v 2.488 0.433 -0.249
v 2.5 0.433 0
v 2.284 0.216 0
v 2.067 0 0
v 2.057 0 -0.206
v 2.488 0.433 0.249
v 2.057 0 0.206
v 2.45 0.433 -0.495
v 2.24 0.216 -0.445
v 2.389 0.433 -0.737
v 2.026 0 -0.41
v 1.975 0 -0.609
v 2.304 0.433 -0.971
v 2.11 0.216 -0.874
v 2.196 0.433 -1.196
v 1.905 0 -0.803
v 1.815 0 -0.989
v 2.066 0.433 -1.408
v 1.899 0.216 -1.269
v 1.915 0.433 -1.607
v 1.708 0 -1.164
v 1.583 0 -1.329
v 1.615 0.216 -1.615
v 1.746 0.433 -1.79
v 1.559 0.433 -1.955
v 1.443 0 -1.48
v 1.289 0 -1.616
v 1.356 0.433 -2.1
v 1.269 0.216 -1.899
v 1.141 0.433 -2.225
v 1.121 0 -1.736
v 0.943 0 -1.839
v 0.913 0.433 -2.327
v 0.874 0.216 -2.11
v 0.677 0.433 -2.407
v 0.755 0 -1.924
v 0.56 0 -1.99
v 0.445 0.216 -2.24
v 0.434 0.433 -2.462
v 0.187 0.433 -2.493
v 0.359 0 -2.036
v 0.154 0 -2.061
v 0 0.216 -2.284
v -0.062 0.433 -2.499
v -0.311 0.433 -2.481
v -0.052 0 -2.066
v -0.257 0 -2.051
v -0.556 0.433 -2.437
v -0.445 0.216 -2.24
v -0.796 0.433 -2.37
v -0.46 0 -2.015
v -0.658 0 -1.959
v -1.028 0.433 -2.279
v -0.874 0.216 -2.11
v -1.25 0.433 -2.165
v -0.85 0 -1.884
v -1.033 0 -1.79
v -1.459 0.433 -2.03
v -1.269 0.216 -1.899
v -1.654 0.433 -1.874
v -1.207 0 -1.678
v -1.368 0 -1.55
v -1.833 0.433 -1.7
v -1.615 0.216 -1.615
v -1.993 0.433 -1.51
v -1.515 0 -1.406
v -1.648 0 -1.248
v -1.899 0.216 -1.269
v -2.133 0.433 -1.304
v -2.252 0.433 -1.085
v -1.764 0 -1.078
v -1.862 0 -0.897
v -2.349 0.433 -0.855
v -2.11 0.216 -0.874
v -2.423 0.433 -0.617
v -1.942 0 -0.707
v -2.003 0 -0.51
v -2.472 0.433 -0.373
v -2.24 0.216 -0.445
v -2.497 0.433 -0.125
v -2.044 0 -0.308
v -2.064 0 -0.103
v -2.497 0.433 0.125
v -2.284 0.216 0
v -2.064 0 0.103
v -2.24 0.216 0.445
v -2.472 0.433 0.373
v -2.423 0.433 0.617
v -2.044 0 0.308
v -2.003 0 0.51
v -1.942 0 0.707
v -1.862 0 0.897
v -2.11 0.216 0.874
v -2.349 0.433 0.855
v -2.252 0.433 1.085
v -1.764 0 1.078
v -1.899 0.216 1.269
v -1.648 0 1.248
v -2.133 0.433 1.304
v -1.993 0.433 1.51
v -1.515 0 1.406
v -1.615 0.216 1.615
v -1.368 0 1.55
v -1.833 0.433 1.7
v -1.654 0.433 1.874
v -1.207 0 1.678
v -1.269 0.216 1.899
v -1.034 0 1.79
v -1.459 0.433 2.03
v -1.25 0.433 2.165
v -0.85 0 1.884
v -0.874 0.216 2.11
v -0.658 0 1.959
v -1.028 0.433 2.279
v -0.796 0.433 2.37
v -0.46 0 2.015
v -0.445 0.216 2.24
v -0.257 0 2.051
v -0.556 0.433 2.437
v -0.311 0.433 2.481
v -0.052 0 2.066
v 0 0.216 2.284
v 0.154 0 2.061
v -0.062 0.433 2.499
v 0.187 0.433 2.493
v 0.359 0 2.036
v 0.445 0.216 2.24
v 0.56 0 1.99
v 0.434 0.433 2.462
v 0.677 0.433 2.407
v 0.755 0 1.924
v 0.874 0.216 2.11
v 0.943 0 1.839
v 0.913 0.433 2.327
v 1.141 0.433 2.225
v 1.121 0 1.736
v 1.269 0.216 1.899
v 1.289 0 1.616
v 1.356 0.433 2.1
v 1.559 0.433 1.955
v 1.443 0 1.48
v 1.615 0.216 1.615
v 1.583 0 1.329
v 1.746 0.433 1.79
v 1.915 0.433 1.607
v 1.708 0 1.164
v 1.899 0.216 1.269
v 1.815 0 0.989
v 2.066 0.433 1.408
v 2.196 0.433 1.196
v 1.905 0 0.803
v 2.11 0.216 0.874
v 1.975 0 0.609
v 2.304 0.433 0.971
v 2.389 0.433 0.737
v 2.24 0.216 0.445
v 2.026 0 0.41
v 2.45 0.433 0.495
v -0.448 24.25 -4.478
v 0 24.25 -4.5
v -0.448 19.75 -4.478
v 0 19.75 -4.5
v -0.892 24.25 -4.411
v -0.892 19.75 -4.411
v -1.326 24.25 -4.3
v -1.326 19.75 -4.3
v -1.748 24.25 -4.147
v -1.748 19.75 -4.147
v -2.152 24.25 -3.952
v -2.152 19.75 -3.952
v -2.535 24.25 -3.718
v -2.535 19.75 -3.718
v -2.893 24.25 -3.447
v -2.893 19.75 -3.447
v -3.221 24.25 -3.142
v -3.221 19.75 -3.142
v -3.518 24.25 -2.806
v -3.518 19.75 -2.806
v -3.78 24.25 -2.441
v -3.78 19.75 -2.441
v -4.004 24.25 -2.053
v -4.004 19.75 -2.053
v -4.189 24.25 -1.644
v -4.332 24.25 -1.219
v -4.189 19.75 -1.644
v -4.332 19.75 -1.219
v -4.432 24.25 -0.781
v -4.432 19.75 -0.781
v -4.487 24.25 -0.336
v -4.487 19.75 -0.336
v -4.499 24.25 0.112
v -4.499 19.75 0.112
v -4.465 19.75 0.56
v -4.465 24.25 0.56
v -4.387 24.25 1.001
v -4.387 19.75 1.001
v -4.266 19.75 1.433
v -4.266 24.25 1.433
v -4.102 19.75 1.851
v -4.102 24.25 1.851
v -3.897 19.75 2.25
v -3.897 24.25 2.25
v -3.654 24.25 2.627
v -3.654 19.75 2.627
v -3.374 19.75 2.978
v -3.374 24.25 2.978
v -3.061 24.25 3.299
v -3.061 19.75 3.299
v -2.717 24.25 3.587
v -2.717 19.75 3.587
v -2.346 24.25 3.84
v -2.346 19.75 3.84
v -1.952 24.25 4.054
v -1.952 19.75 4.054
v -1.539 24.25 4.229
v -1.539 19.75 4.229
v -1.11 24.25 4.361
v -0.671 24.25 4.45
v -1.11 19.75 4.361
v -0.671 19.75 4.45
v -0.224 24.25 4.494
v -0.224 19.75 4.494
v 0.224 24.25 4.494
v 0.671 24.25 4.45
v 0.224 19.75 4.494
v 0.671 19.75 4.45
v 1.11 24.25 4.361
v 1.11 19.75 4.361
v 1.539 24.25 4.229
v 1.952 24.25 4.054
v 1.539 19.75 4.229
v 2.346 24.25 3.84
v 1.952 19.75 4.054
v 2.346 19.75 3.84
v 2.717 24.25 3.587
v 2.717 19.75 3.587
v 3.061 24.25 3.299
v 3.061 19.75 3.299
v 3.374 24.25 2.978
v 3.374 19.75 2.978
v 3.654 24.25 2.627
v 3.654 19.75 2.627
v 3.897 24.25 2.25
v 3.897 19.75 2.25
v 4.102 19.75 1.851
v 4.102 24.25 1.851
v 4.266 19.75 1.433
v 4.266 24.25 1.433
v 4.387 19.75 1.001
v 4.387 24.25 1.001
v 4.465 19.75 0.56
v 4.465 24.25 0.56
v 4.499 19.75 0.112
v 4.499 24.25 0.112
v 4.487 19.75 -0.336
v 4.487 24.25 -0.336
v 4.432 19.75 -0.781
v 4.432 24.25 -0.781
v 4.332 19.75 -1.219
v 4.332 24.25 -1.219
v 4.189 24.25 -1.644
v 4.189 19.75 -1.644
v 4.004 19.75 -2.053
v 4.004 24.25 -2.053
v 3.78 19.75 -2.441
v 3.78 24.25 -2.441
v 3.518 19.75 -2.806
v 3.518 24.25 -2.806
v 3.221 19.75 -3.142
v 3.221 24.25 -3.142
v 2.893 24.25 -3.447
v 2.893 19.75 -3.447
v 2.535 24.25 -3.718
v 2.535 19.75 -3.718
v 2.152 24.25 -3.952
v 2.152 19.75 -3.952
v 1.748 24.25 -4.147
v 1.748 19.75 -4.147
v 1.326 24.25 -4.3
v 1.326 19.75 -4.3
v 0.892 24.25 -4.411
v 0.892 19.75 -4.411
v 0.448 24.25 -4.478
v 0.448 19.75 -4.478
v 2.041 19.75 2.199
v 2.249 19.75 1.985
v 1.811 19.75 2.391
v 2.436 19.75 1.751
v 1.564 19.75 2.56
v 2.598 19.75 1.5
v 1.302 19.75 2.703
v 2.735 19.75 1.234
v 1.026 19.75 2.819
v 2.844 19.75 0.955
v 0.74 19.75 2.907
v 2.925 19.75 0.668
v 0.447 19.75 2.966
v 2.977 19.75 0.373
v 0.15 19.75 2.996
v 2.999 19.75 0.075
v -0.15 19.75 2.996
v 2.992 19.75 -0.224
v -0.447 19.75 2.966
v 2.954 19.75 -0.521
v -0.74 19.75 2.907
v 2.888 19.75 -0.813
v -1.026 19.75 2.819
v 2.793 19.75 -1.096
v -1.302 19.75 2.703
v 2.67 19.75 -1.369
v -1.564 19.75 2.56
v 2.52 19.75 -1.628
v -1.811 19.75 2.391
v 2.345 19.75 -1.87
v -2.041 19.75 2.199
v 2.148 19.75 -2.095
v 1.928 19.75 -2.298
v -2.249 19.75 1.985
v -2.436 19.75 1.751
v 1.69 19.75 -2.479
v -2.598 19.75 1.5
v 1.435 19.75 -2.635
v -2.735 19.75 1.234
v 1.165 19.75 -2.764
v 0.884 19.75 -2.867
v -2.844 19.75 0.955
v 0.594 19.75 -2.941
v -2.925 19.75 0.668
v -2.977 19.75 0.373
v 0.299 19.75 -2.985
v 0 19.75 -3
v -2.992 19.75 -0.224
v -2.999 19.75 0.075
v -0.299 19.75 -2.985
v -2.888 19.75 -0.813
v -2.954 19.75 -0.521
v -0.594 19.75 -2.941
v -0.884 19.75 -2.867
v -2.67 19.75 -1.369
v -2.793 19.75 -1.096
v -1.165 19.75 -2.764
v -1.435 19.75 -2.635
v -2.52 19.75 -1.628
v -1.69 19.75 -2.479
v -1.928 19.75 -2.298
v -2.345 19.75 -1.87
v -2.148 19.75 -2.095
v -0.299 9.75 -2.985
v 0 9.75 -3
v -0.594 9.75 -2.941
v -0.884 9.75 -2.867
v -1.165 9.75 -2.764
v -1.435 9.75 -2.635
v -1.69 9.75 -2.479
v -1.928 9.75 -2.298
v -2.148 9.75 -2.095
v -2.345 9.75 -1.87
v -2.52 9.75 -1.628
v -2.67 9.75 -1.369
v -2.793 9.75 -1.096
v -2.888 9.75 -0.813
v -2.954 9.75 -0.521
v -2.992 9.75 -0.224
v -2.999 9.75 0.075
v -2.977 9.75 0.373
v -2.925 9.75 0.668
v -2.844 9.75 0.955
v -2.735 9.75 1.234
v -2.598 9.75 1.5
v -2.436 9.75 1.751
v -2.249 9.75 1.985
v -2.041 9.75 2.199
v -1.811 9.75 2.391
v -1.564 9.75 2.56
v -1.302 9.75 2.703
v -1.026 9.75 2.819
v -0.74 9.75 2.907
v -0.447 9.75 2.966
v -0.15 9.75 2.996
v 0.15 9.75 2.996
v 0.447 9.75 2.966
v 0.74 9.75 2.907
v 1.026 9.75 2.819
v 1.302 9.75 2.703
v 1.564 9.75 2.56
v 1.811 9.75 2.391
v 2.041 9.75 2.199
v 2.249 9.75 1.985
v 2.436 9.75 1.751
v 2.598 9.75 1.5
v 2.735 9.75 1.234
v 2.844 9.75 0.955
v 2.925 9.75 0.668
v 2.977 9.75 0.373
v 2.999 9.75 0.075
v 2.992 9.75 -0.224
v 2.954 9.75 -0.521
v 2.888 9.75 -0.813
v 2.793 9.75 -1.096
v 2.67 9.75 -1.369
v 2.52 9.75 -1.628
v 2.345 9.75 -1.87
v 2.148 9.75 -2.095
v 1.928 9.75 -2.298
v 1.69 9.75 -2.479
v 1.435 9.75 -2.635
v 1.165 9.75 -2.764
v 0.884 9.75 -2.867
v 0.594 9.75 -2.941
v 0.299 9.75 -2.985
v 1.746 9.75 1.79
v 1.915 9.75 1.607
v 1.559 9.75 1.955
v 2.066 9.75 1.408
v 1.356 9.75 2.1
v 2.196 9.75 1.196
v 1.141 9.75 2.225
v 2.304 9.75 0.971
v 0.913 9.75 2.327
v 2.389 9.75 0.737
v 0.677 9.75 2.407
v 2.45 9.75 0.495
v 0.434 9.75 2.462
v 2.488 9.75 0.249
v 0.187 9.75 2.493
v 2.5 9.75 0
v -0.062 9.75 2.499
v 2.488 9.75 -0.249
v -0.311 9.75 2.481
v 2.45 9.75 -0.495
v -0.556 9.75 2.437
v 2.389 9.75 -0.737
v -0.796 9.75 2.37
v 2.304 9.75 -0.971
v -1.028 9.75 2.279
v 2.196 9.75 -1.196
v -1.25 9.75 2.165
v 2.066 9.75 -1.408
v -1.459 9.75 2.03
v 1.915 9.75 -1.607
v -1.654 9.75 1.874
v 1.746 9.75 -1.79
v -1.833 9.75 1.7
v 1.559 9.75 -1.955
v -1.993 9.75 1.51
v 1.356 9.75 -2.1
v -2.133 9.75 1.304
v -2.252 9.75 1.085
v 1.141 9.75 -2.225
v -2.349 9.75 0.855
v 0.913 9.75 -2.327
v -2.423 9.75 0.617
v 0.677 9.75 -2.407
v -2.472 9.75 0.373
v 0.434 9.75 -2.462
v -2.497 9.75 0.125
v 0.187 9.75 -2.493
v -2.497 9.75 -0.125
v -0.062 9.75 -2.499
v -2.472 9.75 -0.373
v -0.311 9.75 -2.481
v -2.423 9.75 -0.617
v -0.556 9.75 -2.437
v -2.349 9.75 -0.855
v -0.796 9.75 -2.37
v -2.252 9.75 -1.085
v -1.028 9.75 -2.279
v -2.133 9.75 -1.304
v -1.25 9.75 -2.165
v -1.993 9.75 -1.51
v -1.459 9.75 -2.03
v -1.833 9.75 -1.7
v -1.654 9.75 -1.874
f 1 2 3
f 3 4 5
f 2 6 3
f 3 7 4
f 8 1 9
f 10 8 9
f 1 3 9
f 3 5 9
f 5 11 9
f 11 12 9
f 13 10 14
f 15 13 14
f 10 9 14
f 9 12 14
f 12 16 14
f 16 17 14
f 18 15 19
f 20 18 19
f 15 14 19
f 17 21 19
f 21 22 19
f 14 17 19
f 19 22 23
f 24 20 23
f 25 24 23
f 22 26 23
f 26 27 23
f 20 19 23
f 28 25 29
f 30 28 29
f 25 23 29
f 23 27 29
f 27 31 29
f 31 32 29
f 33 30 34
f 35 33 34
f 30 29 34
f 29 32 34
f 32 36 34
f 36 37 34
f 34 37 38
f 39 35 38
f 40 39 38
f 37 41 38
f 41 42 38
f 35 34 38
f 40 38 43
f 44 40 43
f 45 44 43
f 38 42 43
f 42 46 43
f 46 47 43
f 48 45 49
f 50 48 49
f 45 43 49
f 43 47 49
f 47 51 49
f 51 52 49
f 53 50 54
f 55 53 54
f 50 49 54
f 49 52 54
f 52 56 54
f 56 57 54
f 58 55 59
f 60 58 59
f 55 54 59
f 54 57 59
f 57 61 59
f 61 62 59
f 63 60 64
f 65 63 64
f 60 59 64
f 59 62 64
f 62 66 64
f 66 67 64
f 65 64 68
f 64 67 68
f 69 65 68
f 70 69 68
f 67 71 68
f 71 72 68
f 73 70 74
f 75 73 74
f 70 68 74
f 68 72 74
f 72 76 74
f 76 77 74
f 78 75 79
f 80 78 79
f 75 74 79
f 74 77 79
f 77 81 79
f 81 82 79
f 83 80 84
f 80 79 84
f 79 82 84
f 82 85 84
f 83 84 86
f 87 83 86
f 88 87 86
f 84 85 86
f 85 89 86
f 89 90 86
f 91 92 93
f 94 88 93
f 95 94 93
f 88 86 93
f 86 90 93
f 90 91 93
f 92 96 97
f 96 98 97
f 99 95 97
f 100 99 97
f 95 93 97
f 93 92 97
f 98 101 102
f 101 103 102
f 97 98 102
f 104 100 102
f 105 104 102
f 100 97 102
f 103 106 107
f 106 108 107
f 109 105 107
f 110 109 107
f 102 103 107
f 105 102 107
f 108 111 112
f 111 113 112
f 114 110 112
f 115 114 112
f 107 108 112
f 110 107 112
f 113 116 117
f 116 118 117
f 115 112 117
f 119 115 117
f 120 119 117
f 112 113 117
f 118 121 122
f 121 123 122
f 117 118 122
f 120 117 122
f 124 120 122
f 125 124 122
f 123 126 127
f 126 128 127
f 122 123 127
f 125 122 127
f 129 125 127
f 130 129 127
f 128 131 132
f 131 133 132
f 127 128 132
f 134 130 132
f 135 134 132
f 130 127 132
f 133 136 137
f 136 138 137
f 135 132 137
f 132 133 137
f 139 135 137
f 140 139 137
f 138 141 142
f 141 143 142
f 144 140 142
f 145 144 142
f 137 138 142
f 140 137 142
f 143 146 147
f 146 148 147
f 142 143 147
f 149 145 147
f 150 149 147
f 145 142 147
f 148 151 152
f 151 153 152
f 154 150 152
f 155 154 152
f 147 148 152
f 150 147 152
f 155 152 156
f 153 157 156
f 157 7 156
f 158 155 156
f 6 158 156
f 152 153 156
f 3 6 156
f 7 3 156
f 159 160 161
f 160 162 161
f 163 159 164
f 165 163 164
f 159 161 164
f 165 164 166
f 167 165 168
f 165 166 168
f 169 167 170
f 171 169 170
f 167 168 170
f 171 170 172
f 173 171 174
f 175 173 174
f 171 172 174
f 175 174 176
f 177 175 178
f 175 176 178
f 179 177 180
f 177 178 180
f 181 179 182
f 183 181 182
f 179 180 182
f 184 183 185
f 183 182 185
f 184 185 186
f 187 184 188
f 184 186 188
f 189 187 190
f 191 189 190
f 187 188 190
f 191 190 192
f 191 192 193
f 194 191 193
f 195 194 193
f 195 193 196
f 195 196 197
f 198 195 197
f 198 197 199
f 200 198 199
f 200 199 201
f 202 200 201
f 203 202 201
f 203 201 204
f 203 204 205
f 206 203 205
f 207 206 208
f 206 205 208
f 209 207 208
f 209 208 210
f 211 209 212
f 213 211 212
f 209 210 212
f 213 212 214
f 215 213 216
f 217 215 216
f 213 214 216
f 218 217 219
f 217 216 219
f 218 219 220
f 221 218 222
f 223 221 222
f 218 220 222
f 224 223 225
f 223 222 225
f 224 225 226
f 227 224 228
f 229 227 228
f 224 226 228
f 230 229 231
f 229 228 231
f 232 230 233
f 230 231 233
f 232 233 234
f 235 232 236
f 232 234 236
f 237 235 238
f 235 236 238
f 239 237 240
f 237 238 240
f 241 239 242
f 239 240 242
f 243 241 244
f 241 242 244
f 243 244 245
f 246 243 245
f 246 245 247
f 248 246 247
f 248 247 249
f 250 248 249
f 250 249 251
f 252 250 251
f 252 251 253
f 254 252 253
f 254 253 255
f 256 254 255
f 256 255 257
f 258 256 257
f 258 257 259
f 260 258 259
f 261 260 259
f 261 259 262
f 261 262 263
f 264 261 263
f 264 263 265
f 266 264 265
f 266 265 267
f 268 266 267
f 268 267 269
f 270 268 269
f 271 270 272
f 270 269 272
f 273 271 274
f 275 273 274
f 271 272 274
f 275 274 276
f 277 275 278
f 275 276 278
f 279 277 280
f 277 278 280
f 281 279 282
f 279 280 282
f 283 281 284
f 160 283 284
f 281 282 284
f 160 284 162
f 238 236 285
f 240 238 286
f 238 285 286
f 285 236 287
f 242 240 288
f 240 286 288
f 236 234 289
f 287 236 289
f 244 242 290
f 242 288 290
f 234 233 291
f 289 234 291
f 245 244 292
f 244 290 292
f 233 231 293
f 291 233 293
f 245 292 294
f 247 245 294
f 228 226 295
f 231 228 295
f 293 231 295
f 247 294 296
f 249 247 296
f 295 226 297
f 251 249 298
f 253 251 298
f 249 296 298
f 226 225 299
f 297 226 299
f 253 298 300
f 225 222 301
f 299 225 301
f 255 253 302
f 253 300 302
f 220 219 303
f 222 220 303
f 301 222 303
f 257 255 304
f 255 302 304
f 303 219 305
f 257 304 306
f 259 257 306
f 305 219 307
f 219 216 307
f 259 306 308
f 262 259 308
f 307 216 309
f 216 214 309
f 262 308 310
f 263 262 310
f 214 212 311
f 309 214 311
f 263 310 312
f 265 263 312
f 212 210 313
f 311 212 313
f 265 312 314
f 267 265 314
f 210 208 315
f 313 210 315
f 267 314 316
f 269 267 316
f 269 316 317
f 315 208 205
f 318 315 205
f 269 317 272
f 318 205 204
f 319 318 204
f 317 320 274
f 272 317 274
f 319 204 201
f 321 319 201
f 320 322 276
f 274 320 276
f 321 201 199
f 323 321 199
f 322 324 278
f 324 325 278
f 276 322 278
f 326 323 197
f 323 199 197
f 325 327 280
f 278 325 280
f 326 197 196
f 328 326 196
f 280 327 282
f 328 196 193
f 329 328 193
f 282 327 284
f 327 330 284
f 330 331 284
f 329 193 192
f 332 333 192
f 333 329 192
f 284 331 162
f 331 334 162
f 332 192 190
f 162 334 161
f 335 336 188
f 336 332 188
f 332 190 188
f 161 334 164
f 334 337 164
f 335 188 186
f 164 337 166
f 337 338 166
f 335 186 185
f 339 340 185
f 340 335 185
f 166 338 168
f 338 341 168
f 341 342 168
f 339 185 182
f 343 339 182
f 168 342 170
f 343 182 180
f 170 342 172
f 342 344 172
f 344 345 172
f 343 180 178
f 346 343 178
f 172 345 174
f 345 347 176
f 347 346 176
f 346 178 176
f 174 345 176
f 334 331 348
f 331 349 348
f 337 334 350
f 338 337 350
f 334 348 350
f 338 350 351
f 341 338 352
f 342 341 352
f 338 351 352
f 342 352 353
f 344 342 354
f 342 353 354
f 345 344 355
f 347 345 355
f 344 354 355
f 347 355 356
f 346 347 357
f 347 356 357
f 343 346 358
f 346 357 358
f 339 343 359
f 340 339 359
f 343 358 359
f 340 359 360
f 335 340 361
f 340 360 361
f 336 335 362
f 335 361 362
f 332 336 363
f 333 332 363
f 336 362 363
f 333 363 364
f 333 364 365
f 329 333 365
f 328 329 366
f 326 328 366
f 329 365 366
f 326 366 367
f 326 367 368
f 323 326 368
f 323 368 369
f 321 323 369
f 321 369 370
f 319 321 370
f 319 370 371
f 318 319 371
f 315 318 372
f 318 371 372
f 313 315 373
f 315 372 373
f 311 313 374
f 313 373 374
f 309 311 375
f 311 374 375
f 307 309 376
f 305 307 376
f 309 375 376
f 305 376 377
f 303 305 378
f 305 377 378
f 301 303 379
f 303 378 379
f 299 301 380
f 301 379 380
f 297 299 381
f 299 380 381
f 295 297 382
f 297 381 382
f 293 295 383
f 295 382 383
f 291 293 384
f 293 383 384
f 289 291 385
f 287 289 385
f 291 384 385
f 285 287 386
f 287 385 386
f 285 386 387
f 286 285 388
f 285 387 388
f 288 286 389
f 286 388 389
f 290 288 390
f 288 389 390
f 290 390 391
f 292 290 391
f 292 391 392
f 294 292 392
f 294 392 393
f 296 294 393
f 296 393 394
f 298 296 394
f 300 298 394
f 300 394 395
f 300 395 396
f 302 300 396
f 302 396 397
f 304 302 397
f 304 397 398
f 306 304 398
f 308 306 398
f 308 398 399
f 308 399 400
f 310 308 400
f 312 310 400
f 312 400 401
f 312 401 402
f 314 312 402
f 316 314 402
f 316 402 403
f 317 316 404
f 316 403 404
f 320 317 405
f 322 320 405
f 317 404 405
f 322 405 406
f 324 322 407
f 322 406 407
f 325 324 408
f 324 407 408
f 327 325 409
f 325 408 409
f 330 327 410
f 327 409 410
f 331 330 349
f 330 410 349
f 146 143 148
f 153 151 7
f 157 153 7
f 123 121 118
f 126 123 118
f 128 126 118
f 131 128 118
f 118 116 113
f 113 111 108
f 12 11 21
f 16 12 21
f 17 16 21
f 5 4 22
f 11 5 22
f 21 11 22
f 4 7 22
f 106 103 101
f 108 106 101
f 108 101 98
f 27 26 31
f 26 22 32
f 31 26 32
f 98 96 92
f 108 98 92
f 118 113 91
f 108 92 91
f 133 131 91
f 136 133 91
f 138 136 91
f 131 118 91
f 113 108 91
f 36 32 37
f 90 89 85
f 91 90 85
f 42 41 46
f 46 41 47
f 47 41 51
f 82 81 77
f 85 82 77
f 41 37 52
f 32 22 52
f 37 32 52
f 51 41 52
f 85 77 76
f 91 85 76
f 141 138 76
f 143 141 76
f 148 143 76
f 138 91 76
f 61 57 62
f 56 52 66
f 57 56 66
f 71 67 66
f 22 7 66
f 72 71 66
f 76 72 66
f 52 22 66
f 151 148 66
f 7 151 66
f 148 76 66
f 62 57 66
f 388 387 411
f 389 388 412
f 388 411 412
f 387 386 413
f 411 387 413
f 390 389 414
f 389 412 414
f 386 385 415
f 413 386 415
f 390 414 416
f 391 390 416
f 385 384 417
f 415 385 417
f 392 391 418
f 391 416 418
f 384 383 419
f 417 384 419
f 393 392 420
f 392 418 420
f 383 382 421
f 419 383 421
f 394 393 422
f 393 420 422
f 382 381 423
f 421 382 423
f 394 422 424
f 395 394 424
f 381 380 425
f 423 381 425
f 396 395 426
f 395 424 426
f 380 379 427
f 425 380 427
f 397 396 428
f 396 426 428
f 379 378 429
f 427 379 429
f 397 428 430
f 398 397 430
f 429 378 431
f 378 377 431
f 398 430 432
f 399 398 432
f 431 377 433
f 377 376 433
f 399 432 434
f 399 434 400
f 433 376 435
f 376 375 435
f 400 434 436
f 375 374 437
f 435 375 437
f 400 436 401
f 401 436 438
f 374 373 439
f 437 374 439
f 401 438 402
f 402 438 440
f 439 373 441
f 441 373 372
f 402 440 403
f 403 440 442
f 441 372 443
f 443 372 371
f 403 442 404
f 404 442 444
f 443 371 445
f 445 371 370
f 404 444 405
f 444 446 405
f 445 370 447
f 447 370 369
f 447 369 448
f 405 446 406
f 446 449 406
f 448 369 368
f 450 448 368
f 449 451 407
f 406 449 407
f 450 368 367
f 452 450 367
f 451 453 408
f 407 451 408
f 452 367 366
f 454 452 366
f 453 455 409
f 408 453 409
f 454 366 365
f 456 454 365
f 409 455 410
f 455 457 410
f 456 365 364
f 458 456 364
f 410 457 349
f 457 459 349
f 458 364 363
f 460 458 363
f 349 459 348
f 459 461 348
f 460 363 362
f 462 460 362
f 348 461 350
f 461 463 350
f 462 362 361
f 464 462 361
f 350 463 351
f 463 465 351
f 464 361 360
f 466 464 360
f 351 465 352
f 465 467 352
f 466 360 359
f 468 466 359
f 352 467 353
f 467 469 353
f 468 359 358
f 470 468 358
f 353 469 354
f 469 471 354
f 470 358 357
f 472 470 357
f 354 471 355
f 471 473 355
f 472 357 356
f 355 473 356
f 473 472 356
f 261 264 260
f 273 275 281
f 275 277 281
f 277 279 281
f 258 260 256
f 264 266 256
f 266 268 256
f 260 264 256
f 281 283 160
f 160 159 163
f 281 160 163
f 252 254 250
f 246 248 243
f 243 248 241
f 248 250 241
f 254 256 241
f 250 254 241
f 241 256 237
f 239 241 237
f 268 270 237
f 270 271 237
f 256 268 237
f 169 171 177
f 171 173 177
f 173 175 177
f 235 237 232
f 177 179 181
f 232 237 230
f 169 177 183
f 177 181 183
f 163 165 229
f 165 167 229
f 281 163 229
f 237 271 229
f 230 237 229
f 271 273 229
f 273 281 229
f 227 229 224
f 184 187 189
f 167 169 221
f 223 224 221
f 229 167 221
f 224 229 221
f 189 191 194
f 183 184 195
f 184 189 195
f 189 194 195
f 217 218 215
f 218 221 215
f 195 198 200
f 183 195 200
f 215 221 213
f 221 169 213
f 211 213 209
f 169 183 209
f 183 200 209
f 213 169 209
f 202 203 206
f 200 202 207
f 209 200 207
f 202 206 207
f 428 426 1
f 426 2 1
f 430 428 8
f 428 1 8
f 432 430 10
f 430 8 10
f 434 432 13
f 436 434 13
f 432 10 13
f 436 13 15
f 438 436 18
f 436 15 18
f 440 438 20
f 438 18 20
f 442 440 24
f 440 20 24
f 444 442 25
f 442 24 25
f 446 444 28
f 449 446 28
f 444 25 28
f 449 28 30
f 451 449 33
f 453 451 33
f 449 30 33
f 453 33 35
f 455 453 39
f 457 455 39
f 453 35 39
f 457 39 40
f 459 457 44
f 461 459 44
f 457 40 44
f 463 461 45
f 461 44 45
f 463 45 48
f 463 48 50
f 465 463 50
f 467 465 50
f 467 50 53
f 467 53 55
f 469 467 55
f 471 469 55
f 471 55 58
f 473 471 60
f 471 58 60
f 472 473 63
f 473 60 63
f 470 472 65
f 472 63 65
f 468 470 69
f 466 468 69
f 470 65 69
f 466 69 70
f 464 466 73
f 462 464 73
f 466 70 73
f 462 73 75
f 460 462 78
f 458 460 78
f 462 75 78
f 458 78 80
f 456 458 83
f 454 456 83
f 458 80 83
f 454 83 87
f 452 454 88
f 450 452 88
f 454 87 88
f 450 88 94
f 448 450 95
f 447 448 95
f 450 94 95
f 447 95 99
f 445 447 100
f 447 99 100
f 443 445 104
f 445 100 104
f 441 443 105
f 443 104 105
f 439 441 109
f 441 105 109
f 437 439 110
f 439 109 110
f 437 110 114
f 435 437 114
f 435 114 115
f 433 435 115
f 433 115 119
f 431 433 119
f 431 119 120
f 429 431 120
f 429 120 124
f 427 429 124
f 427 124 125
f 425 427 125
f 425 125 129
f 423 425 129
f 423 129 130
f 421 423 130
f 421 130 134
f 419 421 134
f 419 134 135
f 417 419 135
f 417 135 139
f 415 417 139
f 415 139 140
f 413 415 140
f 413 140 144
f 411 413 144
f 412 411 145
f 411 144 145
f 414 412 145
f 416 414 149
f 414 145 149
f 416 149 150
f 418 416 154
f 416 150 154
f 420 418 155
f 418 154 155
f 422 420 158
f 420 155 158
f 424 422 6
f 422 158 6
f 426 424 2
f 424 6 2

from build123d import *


# Read off the part's stored shape, not the designer's step: M5 机械螺纹 螺柱1
with BuildPart() as part:
    # 草图1 → 旋转1 (revolve)
    with BuildSketch(Plane.XY, mode=Mode.PRIVATE) as revolve_1_sk:
        Polygon((0, 0), (0, 24.25), (4.5, 24.25), (4.5, 19.75), (3, 19.75), (3, 9.75), (2.8, 9.75), (2.8, 0), align=None)
    revolve(revolve_1_sk.sketch.rotate(Axis((0, 0, 0), (0, 1, 0)), 90), axis=Axis((0, 0, 0), (0, 1, 0)))

    # M5 机械螺纹 螺柱1 outline → M5 机械螺纹 螺柱1 (revolve, cut)
    with BuildSketch(Plane.XY):
        Polygon((2.8, 9.75), (2.5, 9.75), (2.5, 0.433), (2.067, 0), (2.8, 0), align=None)
    revolve(axis=Axis((0, 0, 0), (0, 1, 0)), mode=Mode.SUBTRACT)


solid = part.part
